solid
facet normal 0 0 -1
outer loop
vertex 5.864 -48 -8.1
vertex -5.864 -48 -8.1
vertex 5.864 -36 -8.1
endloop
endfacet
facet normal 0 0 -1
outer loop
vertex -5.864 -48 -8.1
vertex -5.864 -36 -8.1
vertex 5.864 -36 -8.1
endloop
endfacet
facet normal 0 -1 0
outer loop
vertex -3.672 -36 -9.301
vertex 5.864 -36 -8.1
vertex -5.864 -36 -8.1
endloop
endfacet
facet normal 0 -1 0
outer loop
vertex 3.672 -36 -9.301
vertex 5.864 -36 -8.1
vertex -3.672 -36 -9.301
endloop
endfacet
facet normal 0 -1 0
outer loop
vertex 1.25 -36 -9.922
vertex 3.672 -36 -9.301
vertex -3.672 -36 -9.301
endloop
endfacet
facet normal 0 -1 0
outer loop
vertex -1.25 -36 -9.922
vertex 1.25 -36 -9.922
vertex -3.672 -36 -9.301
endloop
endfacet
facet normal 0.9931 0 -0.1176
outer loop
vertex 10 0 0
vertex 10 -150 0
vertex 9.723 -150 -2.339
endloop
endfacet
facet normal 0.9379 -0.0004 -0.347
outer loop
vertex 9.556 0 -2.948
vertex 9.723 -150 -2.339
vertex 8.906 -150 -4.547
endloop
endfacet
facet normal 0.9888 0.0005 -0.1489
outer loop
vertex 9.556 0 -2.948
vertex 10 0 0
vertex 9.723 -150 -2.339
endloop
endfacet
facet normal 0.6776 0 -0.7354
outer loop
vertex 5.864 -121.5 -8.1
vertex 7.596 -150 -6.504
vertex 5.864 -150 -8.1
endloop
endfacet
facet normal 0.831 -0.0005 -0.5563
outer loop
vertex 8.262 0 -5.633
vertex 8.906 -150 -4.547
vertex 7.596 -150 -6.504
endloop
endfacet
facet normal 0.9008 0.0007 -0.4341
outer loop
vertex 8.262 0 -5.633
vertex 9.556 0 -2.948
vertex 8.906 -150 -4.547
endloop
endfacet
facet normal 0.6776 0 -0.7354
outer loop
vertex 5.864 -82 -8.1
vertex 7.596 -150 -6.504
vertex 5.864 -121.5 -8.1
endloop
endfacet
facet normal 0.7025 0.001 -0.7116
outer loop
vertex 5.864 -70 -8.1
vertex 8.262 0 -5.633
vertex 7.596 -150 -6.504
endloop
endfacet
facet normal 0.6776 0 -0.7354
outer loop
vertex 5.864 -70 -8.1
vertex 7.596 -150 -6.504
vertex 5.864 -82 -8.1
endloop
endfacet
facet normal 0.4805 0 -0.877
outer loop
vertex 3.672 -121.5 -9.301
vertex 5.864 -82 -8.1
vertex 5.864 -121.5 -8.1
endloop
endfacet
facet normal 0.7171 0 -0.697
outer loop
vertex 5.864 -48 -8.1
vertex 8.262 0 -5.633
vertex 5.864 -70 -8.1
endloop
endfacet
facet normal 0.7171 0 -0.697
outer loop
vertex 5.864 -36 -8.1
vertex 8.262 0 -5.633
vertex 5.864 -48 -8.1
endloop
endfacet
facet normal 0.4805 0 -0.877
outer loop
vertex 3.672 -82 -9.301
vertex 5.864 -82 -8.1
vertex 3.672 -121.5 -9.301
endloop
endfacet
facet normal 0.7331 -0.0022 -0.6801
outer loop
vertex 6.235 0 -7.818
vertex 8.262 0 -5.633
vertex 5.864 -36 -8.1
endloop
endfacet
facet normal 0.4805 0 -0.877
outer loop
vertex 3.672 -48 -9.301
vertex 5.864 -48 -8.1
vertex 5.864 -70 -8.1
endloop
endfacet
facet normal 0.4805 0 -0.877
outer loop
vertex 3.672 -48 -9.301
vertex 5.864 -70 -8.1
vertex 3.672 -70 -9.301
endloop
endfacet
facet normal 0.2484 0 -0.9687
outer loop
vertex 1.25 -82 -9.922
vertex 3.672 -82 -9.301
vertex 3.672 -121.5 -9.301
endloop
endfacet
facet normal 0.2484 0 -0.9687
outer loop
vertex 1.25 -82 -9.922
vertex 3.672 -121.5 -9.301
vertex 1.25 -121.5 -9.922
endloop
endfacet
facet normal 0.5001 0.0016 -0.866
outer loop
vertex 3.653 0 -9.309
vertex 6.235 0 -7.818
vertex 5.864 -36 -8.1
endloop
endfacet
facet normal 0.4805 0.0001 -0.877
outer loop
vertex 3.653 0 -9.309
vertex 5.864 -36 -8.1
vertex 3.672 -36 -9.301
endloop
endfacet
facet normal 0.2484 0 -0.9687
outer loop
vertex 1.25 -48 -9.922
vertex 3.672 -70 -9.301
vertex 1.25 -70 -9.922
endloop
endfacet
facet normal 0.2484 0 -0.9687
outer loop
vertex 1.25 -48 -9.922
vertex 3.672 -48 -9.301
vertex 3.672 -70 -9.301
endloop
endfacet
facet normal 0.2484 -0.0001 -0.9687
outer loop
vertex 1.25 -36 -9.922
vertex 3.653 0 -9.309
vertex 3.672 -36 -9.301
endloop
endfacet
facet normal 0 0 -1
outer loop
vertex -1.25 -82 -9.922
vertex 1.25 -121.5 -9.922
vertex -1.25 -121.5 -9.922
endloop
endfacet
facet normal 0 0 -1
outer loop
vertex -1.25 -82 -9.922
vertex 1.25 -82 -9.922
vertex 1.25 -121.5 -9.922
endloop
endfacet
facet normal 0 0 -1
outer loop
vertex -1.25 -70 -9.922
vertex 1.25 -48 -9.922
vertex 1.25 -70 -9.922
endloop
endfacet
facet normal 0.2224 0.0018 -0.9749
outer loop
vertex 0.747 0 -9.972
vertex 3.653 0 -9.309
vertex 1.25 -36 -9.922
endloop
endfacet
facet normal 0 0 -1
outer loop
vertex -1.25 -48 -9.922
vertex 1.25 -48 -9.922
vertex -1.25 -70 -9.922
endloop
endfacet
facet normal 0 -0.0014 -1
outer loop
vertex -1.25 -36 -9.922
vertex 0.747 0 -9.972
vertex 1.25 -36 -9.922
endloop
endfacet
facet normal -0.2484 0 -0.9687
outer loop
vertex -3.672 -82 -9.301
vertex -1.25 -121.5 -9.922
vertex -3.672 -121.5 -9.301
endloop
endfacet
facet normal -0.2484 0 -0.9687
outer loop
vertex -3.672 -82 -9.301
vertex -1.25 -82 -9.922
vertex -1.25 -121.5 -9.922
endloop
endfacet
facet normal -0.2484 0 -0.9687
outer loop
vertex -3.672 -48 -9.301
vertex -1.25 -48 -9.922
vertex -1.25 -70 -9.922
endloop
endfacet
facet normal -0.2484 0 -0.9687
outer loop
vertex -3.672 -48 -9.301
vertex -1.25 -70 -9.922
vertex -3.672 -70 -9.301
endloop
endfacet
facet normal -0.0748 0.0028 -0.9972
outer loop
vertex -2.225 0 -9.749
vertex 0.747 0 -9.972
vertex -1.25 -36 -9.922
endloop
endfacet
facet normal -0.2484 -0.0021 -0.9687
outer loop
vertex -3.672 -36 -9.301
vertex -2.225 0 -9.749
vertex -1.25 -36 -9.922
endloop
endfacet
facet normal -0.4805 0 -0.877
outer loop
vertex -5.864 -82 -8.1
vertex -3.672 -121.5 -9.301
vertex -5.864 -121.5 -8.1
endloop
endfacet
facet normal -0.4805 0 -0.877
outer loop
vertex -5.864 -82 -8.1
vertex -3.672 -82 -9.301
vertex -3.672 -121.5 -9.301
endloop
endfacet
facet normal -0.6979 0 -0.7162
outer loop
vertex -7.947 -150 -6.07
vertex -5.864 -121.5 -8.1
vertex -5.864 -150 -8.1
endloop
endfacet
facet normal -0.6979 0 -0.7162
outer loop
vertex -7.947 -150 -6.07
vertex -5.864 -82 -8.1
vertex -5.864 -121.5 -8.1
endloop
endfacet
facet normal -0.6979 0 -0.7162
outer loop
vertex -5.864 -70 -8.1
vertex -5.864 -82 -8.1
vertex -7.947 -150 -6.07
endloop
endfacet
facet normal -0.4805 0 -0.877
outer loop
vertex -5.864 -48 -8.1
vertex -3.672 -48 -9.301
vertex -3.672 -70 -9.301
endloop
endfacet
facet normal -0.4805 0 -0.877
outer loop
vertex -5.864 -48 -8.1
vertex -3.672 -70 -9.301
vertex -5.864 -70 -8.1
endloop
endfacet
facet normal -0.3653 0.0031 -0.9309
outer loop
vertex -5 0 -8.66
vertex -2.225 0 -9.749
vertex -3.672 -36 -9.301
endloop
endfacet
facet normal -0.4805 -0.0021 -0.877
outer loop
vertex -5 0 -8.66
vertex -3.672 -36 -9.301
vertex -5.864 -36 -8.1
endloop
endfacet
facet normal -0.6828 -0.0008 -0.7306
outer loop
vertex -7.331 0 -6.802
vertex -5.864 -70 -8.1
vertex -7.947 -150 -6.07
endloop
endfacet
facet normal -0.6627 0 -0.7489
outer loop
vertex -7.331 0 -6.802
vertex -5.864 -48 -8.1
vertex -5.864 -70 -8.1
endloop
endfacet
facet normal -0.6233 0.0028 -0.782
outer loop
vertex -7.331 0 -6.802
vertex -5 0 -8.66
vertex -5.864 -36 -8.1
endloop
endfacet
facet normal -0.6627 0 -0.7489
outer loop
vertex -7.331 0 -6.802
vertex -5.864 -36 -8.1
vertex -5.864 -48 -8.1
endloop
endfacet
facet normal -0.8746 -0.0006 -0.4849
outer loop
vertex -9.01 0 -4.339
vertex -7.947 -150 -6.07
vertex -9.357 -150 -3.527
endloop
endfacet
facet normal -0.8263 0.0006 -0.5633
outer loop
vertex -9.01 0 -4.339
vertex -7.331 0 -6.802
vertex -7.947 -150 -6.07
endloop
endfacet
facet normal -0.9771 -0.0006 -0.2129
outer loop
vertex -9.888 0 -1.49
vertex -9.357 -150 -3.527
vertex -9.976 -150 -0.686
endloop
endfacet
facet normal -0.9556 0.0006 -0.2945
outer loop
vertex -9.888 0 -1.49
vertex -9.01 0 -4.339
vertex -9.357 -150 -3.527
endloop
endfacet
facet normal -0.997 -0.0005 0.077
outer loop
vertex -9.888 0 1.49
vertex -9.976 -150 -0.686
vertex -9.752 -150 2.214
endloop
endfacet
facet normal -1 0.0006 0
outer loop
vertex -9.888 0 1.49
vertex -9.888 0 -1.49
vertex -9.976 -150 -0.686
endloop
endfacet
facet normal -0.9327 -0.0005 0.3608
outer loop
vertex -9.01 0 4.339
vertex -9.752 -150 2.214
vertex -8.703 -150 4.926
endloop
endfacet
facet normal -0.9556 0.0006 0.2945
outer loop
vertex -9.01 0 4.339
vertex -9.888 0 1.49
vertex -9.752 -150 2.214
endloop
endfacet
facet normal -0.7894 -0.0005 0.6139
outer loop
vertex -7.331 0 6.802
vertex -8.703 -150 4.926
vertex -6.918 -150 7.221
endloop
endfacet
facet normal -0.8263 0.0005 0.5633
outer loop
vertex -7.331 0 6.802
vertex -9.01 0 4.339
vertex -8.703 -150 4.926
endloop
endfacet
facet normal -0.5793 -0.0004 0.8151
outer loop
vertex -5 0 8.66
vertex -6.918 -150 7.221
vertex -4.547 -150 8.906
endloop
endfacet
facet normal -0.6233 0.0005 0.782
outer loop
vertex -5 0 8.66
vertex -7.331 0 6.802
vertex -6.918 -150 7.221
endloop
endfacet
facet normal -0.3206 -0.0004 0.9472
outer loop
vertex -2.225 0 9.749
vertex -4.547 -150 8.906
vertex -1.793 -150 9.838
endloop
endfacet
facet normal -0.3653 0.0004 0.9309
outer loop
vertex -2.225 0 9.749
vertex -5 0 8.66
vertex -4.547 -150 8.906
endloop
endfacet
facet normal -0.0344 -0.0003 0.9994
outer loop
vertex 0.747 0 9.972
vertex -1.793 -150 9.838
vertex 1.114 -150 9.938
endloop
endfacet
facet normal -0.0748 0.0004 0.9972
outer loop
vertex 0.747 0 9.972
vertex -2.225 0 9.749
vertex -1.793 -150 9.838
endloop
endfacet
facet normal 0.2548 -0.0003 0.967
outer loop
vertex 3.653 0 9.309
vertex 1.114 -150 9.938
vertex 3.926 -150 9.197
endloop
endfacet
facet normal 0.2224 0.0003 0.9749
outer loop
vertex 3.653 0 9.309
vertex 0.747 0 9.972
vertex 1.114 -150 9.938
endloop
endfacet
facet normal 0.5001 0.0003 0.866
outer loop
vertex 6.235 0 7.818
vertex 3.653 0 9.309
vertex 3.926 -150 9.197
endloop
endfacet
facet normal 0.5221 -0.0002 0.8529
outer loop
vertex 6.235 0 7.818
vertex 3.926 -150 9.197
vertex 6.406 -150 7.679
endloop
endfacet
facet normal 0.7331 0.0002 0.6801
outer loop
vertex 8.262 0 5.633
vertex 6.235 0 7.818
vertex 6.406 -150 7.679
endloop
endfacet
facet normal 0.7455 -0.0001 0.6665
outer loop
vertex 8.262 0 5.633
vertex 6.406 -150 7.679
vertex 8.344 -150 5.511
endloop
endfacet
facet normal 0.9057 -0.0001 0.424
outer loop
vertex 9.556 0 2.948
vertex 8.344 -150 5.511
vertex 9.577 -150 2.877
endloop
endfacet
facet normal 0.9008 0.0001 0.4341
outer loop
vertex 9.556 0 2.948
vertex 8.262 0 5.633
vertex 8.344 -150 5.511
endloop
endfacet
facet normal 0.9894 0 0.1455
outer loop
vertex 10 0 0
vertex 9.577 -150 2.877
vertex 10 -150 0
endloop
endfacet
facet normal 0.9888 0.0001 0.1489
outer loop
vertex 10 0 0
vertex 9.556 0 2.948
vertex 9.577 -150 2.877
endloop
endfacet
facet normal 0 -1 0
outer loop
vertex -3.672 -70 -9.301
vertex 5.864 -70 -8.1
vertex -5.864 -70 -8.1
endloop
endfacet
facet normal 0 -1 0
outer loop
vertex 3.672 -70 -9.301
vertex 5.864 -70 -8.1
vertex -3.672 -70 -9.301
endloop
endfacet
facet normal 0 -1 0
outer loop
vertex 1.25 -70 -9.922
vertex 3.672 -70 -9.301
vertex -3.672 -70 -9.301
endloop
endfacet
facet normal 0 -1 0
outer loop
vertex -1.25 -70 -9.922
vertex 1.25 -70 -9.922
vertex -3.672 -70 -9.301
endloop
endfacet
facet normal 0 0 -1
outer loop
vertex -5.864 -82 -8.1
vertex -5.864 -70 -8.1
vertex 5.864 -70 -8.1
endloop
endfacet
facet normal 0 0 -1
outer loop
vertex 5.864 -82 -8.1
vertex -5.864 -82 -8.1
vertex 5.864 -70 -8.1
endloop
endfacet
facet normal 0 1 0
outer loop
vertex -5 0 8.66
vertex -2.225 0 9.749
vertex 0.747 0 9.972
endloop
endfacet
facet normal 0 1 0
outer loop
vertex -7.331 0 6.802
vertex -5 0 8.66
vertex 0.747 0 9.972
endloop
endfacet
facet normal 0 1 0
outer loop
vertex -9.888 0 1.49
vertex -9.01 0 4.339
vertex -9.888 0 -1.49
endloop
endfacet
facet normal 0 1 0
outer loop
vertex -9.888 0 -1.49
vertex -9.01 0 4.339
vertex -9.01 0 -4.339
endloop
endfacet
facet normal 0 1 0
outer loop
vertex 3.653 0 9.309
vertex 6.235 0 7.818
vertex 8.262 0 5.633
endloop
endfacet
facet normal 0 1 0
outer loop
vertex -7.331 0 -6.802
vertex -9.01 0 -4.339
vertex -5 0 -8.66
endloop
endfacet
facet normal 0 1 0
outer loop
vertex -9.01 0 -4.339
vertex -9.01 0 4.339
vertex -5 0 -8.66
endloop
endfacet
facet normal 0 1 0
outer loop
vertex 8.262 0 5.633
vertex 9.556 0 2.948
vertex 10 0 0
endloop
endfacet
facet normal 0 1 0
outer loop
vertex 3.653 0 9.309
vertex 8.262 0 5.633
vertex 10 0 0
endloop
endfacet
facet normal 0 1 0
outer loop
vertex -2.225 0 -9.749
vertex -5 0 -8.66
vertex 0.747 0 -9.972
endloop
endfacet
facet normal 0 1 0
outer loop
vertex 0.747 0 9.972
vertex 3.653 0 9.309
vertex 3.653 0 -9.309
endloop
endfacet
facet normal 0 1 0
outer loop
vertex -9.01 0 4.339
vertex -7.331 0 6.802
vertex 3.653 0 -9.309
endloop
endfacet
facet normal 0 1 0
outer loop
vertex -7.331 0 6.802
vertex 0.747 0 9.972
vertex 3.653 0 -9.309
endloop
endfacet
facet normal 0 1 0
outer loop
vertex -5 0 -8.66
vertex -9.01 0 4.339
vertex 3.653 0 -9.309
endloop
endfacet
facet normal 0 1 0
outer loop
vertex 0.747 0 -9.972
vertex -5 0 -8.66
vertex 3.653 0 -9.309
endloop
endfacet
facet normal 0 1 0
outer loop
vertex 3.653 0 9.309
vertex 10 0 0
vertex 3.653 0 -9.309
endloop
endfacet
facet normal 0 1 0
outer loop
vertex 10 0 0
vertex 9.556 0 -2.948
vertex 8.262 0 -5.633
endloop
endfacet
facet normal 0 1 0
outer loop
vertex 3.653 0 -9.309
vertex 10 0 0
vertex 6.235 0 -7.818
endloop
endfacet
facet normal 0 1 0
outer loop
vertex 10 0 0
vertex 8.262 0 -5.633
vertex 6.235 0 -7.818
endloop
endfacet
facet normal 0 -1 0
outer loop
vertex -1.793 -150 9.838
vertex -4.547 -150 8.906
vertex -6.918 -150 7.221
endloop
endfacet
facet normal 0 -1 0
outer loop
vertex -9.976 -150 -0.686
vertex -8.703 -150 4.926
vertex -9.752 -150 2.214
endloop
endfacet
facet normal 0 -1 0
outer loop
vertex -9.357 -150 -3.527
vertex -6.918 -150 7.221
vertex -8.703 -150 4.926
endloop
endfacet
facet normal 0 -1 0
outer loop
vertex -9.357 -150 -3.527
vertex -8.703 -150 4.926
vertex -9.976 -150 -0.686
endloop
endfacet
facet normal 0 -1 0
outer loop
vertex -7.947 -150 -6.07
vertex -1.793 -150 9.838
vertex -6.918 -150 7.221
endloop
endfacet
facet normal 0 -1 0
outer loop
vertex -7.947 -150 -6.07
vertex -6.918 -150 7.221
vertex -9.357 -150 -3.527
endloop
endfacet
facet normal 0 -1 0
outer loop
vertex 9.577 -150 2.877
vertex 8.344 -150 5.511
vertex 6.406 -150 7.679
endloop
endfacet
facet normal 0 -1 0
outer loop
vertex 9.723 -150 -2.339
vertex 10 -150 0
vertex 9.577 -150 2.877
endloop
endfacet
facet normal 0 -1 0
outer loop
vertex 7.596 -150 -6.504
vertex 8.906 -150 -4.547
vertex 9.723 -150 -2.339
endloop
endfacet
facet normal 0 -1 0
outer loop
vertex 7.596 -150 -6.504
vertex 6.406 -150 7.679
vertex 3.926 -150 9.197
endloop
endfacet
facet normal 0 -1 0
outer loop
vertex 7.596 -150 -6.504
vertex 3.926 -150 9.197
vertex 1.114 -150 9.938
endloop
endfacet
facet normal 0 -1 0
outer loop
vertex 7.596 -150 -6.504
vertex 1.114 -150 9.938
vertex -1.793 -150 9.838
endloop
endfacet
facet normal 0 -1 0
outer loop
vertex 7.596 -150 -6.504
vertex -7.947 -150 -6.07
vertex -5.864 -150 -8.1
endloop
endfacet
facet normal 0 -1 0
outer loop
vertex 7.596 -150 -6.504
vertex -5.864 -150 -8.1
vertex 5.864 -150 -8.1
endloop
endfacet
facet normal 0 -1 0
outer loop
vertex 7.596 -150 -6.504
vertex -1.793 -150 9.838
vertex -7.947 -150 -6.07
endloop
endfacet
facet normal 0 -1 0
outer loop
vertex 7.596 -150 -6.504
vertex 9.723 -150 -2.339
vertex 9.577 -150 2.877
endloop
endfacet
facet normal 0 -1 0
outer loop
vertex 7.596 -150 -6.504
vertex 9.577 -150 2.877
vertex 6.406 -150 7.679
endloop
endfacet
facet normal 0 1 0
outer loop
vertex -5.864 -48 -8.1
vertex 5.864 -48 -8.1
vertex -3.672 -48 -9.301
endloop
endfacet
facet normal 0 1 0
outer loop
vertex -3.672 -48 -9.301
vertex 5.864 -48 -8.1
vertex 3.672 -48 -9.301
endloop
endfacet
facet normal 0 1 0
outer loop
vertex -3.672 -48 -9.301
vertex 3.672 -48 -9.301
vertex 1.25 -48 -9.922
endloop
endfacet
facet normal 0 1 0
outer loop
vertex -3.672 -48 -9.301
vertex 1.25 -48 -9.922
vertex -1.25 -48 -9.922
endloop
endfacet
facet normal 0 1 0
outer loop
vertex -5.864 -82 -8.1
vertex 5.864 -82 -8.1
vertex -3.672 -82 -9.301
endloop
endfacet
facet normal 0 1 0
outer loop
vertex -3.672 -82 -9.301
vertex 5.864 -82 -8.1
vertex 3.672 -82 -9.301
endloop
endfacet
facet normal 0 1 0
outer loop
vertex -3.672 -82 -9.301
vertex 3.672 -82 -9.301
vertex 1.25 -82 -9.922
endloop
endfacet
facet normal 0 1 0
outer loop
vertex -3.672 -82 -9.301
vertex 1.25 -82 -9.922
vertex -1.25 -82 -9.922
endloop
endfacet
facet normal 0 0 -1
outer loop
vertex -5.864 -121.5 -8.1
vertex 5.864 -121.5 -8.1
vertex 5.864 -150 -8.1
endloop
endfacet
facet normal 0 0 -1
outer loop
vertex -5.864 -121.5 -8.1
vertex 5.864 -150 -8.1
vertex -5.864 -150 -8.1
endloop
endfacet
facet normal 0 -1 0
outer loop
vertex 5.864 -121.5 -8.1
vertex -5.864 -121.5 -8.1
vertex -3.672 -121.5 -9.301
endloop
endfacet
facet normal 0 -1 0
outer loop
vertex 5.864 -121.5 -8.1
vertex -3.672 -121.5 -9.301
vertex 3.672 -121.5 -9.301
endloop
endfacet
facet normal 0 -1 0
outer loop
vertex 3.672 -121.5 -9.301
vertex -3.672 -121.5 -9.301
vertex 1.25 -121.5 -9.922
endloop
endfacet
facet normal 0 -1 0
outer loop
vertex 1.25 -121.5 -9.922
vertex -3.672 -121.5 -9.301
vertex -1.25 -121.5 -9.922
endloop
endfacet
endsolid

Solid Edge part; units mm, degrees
sketch "Sketch1" plane through (0, 0, 0) normal (0, -1, 0) x (1, 0, 0)
  circle A0 centre (0, 0) radius 10
extrude "Extrusionsausprägung_15" add sketch "Sketch1" along normal blind 150
sketch "Sketch2" plane through (0, -136, 0) normal (0, -1, 0) x (-1, 0, 0)
  line L0 (42.474, 10.1) -> (-42.474, 10.1)
  line L1 (-42.474, 10.1) -> (-42.474, 8.1)
  line L2 (-42.474, 8.1) -> (42.474, 8.1)
  line L3 (42.474, 8.1) -> (42.474, 10.1)
extrude "Extrusionsausschnitt_23" cut sketch "Sketch2" along normal mid plane 29
sketch "Sketch3" plane through (0, -76, 0) normal (0, -1, 0) x (-1, 0, 0)
  line L0 (-42.474, 10.1) -> (42.474, 10.1)
  line L1 (42.474, 10.1) -> (42.474, 8.1)
  line L2 (42.474, 8.1) -> (-42.474, 8.1)
  line L3 (-42.474, 8.1) -> (-42.474, 10.1)
extrude "Extrusionsausprägung_16" cut sketch "Sketch3" along normal mid plane 12
sketch "Sketch4" plane through (0, -42, 0) normal (0, -1, 0) x (-1, 0, 0)
  line L0 (-42.474, 10.1) -> (42.474, 10.1)
  line L1 (42.474, 10.1) -> (42.474, 8.1)
  line L2 (42.474, 8.1) -> (-42.474, 8.1)
  line L3 (-42.474, 8.1) -> (-42.474, 10.1)
extrude "Extrusionsausschnitt_25" cut sketch "Sketch4" along normal mid plane 12
